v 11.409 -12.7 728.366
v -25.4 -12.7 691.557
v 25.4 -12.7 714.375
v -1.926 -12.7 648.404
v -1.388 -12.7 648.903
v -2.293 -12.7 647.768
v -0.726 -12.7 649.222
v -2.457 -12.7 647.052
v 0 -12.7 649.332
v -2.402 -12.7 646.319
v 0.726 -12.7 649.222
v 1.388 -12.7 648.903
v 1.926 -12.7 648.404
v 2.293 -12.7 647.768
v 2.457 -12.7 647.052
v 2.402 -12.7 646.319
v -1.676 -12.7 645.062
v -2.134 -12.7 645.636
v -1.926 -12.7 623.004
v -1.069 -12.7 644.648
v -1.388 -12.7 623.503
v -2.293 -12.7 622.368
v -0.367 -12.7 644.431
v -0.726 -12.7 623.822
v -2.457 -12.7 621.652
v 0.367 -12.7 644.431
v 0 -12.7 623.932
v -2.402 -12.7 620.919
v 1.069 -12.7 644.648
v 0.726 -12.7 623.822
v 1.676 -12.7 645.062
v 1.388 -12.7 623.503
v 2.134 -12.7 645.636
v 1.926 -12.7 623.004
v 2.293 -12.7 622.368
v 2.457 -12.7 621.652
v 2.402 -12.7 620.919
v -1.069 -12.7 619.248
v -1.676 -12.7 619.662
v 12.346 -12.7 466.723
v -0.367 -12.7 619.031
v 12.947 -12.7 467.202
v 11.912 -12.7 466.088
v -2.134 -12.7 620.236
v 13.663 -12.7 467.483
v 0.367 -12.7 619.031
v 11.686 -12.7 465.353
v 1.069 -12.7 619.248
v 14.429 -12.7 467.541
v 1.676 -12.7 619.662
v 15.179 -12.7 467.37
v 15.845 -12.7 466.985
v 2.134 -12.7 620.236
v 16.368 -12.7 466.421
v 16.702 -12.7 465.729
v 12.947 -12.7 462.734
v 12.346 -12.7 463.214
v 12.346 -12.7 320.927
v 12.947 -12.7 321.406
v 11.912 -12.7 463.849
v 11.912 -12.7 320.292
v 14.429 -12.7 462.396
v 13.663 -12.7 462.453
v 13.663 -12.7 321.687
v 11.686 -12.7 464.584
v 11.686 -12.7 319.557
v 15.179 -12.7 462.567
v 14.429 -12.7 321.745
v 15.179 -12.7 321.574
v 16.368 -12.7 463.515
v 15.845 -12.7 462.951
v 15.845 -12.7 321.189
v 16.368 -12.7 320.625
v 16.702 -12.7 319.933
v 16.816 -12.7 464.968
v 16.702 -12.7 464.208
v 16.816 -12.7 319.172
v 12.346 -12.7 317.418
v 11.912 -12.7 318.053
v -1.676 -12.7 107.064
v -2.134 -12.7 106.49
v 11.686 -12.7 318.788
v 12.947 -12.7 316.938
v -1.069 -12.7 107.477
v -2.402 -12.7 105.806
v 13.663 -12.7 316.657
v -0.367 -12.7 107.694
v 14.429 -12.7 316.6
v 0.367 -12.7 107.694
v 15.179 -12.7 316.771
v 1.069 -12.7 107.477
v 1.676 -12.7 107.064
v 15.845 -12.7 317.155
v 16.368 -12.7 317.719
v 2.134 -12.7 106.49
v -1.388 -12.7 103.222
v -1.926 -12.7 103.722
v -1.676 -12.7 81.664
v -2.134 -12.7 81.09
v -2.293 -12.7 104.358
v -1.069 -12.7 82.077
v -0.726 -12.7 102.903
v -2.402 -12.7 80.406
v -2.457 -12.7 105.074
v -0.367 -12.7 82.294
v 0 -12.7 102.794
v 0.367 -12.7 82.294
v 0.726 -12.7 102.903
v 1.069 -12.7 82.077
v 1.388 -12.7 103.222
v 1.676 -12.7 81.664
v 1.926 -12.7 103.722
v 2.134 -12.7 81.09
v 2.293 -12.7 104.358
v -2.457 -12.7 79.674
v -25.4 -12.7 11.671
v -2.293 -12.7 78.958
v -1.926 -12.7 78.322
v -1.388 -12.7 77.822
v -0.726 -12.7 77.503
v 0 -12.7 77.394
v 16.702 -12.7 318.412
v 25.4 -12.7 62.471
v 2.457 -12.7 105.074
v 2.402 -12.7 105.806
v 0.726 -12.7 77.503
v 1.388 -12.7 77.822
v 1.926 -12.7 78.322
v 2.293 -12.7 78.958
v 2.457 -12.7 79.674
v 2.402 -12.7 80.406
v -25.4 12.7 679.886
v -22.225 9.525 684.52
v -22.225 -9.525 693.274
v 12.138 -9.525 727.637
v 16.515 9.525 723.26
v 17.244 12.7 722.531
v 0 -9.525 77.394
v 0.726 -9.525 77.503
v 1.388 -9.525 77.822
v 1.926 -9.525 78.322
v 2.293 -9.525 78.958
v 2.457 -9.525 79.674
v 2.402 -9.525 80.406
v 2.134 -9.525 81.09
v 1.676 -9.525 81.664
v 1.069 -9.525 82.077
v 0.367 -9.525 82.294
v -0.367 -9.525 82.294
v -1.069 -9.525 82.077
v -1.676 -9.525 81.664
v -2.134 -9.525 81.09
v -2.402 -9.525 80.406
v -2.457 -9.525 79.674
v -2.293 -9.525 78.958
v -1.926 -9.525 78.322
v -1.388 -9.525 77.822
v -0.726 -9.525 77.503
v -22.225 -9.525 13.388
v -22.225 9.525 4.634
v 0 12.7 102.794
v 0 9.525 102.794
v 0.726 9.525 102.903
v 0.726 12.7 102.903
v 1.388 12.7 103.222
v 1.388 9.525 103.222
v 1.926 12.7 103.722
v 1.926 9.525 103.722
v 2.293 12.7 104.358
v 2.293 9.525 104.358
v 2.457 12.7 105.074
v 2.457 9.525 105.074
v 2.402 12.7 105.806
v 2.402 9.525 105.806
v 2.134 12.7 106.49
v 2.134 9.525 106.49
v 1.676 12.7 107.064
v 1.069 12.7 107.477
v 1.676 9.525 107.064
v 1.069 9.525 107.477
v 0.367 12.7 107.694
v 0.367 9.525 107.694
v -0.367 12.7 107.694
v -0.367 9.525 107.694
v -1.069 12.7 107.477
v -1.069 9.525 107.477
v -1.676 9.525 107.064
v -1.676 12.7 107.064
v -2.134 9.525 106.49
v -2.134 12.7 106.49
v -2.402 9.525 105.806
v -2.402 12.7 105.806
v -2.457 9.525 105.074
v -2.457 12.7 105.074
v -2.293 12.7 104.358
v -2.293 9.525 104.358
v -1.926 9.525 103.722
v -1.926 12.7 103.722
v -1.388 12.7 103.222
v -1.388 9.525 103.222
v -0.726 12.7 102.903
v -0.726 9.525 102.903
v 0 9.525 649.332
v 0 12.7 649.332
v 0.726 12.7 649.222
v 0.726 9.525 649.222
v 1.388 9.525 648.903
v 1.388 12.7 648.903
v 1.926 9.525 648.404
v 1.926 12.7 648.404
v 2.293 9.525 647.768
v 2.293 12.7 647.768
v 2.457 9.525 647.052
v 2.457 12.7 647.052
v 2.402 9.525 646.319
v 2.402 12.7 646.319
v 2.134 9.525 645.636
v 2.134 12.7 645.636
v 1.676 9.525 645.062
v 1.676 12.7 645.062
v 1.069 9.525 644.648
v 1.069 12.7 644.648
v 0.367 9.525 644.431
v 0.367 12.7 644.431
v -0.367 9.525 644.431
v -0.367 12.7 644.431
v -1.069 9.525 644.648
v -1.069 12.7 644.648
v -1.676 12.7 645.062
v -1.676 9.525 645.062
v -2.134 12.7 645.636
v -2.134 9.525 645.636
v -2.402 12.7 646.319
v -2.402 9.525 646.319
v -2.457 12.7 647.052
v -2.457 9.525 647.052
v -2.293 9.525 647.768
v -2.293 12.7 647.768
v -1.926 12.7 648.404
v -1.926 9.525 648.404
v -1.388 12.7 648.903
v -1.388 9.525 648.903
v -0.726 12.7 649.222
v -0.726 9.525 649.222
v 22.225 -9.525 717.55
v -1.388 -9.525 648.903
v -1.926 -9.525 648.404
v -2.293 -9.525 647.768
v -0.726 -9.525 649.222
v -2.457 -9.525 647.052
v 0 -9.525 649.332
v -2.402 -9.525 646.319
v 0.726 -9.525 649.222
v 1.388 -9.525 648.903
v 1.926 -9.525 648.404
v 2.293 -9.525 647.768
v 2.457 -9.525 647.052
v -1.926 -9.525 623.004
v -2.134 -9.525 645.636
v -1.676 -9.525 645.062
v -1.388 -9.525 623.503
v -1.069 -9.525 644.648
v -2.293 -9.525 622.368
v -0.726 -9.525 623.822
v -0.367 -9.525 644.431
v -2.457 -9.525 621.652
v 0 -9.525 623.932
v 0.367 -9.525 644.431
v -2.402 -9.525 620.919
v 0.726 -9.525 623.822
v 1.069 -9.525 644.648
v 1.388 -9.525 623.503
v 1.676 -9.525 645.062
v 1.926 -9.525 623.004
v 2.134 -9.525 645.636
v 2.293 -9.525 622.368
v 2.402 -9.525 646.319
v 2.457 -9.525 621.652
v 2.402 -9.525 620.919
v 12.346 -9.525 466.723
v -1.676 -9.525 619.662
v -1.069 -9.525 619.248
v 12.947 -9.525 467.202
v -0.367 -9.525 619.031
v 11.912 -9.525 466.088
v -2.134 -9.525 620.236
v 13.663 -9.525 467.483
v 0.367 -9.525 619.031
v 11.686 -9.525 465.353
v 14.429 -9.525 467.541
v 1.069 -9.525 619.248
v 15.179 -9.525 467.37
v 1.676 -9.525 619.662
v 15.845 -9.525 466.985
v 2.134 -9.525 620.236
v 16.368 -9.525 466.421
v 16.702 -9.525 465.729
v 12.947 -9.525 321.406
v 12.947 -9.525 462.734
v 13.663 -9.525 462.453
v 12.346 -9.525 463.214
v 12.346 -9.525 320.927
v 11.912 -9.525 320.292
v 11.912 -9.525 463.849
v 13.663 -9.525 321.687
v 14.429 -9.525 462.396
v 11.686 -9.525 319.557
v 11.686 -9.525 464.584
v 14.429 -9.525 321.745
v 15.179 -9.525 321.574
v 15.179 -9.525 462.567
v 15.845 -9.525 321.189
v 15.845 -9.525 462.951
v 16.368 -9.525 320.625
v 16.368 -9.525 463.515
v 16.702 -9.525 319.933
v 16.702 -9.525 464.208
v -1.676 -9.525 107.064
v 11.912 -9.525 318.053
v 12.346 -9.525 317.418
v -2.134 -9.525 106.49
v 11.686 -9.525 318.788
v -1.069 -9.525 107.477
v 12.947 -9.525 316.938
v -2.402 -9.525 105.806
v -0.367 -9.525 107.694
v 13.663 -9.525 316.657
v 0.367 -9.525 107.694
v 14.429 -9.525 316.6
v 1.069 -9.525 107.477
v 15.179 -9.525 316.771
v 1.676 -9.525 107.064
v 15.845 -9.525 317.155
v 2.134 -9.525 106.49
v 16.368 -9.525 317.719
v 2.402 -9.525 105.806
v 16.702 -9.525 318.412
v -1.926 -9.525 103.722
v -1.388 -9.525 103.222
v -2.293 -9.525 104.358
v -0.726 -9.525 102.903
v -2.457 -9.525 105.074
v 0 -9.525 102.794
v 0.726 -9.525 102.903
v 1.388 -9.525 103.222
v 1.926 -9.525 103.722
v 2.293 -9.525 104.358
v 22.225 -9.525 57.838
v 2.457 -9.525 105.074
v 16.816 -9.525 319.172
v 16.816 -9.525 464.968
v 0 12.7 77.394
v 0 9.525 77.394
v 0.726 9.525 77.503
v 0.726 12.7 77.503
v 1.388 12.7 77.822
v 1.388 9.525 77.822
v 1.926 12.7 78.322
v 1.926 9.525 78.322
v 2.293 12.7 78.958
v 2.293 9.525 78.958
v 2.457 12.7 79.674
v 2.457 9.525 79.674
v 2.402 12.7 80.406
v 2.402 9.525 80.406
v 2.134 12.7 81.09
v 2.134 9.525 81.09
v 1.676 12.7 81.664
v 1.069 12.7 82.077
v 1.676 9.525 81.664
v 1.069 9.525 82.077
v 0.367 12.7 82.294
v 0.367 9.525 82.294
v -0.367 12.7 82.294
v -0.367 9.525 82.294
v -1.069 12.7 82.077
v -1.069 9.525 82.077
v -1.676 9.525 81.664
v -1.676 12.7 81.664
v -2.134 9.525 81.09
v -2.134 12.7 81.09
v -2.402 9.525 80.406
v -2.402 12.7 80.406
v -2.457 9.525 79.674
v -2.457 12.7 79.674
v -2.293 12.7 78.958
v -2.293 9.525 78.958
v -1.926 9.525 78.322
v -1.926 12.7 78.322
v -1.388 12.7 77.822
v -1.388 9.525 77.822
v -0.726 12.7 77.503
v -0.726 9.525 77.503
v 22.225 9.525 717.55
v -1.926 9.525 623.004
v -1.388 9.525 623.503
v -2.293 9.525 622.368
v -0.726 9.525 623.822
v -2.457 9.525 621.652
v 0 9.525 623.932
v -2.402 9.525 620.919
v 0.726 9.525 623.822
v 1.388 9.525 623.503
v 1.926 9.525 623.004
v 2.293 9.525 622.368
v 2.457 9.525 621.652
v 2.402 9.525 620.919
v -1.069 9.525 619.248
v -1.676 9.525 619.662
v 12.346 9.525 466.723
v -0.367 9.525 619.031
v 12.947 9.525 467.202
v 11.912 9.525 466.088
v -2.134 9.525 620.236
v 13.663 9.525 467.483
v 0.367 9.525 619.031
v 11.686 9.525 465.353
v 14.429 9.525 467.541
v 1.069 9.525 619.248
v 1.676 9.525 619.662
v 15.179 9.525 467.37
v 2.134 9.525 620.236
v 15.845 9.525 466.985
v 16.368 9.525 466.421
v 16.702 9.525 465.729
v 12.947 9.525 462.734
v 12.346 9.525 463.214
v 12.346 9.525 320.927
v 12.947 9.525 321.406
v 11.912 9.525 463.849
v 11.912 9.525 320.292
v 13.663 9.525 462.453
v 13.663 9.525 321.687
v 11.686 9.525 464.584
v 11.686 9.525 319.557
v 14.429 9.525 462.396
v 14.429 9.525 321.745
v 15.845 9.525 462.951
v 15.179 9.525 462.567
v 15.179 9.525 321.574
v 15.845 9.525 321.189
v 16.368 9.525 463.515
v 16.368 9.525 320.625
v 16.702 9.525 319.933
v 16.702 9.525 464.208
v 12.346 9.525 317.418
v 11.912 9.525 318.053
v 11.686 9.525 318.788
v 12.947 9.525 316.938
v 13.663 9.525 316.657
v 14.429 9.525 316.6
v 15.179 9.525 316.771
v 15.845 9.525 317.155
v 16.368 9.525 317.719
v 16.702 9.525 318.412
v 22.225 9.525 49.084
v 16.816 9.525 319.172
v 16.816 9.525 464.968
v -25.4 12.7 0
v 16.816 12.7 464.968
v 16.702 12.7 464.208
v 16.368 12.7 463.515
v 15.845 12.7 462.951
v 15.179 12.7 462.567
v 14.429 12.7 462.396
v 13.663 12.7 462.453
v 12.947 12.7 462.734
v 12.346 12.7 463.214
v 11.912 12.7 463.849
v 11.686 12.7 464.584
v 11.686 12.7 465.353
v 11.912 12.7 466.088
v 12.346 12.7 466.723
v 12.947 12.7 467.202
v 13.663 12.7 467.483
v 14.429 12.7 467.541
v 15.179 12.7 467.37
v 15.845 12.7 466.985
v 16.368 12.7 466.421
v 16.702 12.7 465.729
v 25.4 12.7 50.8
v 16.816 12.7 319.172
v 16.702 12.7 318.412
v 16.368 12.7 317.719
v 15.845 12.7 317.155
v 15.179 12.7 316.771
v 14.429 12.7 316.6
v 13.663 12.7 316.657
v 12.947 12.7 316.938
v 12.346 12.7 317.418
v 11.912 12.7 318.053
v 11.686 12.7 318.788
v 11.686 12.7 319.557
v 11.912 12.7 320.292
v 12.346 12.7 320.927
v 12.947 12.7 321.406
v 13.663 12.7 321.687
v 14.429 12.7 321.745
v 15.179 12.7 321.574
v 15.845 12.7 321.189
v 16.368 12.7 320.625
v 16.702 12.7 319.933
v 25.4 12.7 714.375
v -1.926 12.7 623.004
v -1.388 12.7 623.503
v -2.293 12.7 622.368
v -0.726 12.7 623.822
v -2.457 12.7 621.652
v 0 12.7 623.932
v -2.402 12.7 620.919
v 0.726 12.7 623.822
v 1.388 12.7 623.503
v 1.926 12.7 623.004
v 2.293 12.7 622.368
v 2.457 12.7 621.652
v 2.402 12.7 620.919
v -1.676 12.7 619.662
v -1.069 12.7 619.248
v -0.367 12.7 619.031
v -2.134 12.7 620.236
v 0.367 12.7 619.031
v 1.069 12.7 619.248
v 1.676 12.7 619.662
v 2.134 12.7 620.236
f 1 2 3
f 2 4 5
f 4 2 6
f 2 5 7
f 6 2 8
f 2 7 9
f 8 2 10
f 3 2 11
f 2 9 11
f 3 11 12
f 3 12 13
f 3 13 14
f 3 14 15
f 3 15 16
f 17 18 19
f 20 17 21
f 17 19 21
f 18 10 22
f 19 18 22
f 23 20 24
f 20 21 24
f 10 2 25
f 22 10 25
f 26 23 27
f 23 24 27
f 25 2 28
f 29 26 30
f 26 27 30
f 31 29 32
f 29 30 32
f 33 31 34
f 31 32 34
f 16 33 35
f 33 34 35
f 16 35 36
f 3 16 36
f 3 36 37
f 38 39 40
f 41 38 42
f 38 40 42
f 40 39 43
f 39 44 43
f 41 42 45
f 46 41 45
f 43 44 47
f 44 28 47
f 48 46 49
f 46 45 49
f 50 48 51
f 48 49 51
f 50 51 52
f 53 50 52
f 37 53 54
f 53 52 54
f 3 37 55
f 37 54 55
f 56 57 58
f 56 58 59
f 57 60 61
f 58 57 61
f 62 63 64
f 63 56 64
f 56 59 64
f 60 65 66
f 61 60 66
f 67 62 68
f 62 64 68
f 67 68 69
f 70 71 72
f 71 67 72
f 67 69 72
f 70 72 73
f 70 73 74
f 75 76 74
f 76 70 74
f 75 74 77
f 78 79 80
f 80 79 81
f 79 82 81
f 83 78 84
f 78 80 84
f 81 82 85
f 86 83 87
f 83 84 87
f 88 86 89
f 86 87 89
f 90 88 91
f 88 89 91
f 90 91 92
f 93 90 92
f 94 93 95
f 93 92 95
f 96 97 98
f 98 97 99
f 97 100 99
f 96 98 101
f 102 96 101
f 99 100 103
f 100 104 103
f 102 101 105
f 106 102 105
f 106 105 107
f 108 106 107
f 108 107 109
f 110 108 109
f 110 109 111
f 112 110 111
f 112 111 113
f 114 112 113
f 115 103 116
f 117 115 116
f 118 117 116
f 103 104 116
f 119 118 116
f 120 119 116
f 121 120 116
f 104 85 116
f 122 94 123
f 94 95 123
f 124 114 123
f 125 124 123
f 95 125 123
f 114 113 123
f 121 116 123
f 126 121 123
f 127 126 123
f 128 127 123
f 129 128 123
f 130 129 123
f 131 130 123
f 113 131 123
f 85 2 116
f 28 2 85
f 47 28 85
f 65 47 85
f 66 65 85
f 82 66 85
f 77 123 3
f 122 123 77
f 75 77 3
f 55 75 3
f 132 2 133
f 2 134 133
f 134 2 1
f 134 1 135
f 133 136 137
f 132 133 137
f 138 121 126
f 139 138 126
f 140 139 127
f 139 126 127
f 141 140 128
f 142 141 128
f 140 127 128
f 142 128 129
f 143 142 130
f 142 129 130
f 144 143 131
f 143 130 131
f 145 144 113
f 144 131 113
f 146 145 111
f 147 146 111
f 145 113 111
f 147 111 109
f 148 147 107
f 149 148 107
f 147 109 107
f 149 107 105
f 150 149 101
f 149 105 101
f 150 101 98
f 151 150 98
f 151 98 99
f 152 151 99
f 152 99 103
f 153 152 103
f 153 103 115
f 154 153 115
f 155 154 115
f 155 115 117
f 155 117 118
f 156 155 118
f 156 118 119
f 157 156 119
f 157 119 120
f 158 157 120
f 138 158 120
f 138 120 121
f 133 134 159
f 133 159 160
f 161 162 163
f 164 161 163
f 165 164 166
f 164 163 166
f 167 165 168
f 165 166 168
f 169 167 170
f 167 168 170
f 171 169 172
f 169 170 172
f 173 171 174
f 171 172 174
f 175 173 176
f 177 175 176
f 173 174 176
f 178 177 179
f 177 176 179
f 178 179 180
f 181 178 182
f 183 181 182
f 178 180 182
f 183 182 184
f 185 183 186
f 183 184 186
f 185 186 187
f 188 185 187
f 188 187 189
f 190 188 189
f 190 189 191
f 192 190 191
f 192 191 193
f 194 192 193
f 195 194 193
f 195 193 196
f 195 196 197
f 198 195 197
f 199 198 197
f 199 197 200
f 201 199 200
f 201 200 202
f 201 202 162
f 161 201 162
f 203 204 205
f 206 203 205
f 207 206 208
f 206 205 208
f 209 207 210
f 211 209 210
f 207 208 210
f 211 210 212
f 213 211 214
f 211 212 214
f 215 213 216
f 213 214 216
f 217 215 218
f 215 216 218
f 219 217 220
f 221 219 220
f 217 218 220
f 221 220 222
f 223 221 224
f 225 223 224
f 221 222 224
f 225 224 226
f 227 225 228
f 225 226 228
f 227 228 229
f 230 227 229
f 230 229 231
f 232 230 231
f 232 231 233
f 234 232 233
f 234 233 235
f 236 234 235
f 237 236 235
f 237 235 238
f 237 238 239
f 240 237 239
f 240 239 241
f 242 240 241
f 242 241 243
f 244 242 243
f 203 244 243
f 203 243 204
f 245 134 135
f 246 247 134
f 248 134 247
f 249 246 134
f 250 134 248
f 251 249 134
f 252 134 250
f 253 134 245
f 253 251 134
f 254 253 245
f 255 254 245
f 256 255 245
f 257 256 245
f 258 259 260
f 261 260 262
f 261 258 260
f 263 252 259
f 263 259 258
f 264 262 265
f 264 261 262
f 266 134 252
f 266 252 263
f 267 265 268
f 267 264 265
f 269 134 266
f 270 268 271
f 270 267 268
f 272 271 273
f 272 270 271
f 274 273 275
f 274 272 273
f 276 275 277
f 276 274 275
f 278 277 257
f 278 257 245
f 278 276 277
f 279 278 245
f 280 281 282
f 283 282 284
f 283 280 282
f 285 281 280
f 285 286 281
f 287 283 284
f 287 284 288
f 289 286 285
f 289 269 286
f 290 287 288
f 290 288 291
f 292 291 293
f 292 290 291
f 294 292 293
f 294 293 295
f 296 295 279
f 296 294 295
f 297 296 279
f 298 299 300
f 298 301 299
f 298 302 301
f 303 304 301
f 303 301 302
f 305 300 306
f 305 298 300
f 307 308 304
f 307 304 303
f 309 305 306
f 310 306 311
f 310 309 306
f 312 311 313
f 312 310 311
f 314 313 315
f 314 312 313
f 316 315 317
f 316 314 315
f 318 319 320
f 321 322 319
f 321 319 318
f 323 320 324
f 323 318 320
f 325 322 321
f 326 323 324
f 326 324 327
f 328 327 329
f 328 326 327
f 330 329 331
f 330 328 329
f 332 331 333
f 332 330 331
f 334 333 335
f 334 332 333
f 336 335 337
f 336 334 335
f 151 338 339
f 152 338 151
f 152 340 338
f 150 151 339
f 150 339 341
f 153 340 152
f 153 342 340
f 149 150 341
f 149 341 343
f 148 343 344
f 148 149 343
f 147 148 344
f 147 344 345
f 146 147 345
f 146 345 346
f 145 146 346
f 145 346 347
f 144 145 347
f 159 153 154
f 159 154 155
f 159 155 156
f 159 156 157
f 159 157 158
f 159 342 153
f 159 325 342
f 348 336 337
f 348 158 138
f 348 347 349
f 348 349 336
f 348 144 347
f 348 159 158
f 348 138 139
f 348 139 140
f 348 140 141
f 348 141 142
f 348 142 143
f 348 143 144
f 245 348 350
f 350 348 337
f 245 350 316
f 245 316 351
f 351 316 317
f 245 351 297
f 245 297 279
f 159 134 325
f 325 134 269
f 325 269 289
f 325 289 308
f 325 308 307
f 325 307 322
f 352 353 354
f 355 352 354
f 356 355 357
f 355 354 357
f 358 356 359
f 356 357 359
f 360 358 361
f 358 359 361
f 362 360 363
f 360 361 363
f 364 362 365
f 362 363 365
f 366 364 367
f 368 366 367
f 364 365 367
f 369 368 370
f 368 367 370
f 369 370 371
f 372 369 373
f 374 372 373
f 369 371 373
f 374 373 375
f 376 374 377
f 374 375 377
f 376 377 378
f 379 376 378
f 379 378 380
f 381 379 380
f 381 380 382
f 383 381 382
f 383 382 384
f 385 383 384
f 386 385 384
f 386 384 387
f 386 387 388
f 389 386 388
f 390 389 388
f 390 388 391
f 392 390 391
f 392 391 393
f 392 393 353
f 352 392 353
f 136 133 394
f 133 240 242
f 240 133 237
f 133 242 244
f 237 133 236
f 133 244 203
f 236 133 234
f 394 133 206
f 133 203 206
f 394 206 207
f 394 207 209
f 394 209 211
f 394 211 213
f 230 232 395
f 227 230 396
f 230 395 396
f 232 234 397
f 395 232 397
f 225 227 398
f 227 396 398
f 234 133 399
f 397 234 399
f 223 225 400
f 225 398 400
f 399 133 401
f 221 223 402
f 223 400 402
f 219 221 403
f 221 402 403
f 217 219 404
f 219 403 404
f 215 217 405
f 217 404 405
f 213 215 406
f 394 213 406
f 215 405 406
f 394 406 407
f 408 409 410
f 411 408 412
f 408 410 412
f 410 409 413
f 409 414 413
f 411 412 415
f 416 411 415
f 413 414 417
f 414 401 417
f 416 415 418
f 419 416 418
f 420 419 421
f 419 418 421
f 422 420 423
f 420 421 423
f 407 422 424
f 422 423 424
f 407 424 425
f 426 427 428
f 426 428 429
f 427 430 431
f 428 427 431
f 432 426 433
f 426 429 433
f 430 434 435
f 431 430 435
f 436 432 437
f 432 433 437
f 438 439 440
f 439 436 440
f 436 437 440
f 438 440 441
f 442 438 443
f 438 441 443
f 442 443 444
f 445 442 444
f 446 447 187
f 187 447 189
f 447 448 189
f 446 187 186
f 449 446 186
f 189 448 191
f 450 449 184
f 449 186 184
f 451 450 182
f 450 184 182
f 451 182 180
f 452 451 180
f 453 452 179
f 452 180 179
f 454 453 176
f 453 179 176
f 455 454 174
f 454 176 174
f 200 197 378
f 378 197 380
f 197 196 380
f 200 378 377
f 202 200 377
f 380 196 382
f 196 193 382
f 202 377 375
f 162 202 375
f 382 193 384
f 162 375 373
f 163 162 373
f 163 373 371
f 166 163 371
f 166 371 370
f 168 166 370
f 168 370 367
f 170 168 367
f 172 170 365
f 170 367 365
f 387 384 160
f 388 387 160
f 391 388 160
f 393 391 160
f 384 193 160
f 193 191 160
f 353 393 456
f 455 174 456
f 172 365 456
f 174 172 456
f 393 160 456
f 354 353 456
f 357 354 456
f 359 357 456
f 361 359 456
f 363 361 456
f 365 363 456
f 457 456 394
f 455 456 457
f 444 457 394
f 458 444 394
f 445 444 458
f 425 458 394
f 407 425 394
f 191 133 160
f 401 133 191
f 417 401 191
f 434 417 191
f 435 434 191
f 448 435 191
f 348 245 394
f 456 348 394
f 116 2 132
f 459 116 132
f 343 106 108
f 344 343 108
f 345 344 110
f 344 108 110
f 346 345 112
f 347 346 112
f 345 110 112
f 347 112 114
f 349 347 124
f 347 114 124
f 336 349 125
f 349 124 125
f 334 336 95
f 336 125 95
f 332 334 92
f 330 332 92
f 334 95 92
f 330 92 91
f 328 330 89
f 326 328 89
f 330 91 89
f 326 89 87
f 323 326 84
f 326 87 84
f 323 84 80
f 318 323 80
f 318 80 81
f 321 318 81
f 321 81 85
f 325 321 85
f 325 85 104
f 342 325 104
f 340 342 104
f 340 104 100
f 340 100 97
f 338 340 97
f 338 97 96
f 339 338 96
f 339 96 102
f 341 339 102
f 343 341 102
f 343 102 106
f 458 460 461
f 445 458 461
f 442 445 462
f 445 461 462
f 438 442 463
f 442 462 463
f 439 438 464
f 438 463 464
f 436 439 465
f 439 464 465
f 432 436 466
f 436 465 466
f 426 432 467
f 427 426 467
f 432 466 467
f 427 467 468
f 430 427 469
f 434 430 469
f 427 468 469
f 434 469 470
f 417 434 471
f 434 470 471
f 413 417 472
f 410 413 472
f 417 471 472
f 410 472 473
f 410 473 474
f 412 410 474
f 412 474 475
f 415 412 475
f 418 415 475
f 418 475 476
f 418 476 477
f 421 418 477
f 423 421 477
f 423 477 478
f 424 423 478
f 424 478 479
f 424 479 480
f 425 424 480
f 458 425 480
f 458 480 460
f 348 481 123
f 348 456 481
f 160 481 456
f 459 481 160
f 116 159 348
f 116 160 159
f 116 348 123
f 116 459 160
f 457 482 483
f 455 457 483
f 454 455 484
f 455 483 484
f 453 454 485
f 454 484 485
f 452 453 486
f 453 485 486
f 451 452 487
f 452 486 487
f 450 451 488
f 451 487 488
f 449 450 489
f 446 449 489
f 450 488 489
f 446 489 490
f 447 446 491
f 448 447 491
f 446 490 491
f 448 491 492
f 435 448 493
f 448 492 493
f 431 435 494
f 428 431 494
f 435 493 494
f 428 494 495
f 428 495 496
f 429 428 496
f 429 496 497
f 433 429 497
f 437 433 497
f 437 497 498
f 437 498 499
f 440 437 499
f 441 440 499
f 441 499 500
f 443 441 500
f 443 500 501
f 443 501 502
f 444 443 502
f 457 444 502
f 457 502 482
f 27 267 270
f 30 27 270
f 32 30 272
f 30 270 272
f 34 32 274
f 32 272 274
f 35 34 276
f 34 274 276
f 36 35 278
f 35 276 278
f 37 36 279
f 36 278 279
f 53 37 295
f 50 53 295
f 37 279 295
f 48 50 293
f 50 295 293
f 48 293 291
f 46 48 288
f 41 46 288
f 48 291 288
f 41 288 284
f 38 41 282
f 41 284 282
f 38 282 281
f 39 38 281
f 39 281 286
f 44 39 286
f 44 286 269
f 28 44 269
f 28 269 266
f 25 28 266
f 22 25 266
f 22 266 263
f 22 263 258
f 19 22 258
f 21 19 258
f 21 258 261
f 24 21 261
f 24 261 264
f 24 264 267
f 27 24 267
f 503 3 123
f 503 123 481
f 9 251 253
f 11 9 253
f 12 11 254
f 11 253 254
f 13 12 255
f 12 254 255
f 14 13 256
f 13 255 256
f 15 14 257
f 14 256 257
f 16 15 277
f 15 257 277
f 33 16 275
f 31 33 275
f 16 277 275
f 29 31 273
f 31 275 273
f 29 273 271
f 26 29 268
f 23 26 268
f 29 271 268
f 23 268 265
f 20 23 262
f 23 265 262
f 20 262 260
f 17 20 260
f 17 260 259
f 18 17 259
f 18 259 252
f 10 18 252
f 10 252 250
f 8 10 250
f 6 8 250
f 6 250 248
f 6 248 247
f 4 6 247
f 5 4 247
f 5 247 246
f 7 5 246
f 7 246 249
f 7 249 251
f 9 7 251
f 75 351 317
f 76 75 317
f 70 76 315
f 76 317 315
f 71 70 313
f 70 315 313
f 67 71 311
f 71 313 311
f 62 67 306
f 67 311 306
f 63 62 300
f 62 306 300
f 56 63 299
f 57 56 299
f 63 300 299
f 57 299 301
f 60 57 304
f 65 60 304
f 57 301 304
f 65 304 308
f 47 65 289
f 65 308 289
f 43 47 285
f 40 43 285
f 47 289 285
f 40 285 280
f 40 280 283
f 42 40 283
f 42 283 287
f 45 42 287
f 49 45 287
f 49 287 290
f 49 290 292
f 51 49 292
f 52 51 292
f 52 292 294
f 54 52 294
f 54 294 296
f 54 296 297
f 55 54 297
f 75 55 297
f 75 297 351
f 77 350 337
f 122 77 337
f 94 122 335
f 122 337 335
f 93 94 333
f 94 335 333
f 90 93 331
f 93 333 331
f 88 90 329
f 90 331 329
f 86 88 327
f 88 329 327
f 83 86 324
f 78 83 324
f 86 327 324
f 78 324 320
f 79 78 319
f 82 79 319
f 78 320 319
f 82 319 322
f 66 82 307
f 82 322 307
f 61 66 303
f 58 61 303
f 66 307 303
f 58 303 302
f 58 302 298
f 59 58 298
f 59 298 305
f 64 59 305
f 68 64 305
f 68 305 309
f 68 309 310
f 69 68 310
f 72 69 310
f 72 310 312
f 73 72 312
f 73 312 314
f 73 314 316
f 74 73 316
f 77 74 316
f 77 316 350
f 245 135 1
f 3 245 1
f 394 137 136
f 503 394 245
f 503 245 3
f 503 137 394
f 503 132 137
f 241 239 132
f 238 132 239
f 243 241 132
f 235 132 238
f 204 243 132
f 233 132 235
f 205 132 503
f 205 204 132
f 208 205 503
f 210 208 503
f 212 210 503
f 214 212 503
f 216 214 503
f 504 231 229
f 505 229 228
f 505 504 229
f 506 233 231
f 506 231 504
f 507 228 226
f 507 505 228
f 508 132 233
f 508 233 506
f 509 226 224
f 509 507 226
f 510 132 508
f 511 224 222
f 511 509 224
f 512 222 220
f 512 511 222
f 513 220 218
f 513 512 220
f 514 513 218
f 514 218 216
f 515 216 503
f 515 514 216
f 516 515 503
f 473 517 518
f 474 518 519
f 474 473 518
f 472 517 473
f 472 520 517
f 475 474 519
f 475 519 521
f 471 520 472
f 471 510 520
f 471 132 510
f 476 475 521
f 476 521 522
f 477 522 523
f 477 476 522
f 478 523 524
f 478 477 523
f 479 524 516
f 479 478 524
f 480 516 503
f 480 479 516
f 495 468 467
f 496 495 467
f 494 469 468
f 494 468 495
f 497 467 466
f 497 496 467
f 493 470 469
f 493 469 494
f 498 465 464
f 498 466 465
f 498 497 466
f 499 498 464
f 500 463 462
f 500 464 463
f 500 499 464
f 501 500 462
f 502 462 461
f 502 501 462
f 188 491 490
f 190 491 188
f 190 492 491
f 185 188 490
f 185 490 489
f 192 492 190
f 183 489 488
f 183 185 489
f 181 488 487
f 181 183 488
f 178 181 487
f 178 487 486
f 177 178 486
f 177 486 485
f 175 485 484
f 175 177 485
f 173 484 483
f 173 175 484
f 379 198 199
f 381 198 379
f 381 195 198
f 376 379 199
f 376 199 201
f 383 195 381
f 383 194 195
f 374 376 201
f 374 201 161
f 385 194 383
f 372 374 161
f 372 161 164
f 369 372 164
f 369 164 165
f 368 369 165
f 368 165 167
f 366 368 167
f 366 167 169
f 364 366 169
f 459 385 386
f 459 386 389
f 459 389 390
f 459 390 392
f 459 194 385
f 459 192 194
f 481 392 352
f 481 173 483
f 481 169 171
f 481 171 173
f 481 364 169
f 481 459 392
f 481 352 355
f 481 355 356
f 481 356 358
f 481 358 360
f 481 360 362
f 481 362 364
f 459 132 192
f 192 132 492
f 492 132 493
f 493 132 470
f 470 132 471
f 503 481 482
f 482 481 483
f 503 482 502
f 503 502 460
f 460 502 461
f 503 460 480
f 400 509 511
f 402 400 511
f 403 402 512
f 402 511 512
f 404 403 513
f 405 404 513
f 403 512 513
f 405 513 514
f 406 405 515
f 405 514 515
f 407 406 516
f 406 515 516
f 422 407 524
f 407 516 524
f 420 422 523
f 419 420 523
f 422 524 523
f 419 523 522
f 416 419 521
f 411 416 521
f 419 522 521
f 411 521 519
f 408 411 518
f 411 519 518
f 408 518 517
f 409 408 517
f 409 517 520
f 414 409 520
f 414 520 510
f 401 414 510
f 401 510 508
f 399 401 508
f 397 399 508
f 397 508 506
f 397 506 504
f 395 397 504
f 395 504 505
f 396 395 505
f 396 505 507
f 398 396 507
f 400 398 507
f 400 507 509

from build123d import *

# Parameters (mm, degrees)
SKETCH1_W                        = 50.8
SKETCH1_H                        = 25.4
SKETCH1_W_2                      = 44.45
SKETCH1_H_2                      = 19.05
BOSS_EXTRUDE1_DEPTH              = 771.9314
CUT_EXTRUDE1_DEPTH               = 771.9314
CUT_EXTRUDE2_DEPTH               = 773.76672179
CUT_EXTRUDE3_DEPTH               = 757.919388013
CUT_EXTRUDE5_DEPTH               = 771.9314
SKETCH7_R                        = 2.4638
CUT_EXTRUDE6_DEPTH               = 730.251464289
SKETCH8_R                        = 2.4638
CUT_EXTRUDE7_DEPTH               = 730.251464289
F_13_64_0_20313_DIAMETER_HOLE1_D = 5.159502


with BuildPart() as part:
    # Sketch1 → Boss-Extrude1 (new body)
    with BuildSketch(Plane.XY):
        Rectangle(SKETCH1_W, SKETCH1_H)
        Rectangle(SKETCH1_W_2, SKETCH1_H_2, mode=Mode.SUBTRACT)
    extrude(amount=BOSS_EXTRUDE1_DEPTH)

    # Sketch2 → Cut-Extrude1 (cut)
    with BuildSketch(Plane(origin=(0, 12.7, 0), x_dir=(1, 0, 0), z_dir=(0, 1, 0))):
        Polygon((-25.4, 0), (25.4, -50.8), (25.4, 0), align=None)
        Polygon((25.4, -771.9314), (-25.4, -721.1314), (-25.4, -771.9314), align=None)
    extrude(amount=-CUT_EXTRUDE1_DEPTH, mode=Mode.SUBTRACT)

    # Sketch3 → Cut-Extrude2 (cut, through all)
    with BuildSketch(Plane(origin=(0, 12.7, 0), x_dir=(1, 0, 0), z_dir=(0, 1, 0))):
        Polygon((-3.3782, -743.1532), (25.4, -714.375), (25.4, -771.9314), (-3.3782, -771.9314), align=None)
    extrude(amount=-CUT_EXTRUDE2_DEPTH, mode=Mode.SUBTRACT)

    # Sketch4 → Cut-Extrude3 (cut, through all)
    with BuildSketch(Plane(origin=(-12.7, 0, -12.7), x_dir=(0, -1, 0), z_dir=(0.7071067811865571, 0, 0.707106781186538))):
        Polygon((-12.7, -17.960512242), (12.7, -26.213472526), (12.7, -17.960512242), align=None)
    extrude(amount=CUT_EXTRUDE3_DEPTH, mode=Mode.SUBTRACT)

    # Sketch6 → Cut-Extrude5 (cut)
    with BuildSketch(Plane(origin=(369.8875, 0, 369.8875), x_dir=(0.7071067811865437, 0, -0.7071067811865513), z_dir=(0.7071067811865513, 0, 0.7071067811865437))):
        Polygon((-506.965494568, -12.7), (-498.712534284, 12.7), (-506.965494568, 12.7), (-527.877415309, 12.7), (-527.877415309, -12.7), align=None)
    extrude(amount=-CUT_EXTRUDE5_DEPTH, mode=Mode.SUBTRACT)

    # Sketch7 → Cut-Extrude6 (cut, through all)
    with BuildSketch(Plane.XZ.offset(12.7)):
        with Locations(Location((0, 105.257676555, 0), (0, 0, 270))):
            Circle(SKETCH7_R)
        with Locations(Location((0, 79.857676555, 0), (0, 0, 270))):
            Circle(SKETCH7_R)
    extrude(amount=-CUT_EXTRUDE6_DEPTH, mode=Mode.SUBTRACT)

    # Sketch8 → Cut-Extrude7 (cut, through all)
    with BuildSketch(Plane(origin=(0, 12.7, 0), x_dir=(1, 0, 0), z_dir=(0, 1, 0))):
        with Locations(Location((0, -646.867704494, 0), (0, 0, 270))):
            Circle(SKETCH8_R)
        with Locations(Location((0, -621.467704494, 0), (0, 0, 270))):
            Circle(SKETCH8_R)
    extrude(amount=-CUT_EXTRUDE7_DEPTH, mode=Mode.SUBTRACT)

    # 13/64 (0.20313) Diameter Hole1 (through all)
    with Locations(Plane(origin=(0, -12.7, 0), x_dir=(-1, 0, 0), z_dir=(0, -1, 0))):
        with Locations((-14.2367, -319.172239037), (-14.2367, -464.968239037)):
            Hole(F_13_64_0_20313_DIAMETER_HOLE1_D / 2)


solid = part.part
